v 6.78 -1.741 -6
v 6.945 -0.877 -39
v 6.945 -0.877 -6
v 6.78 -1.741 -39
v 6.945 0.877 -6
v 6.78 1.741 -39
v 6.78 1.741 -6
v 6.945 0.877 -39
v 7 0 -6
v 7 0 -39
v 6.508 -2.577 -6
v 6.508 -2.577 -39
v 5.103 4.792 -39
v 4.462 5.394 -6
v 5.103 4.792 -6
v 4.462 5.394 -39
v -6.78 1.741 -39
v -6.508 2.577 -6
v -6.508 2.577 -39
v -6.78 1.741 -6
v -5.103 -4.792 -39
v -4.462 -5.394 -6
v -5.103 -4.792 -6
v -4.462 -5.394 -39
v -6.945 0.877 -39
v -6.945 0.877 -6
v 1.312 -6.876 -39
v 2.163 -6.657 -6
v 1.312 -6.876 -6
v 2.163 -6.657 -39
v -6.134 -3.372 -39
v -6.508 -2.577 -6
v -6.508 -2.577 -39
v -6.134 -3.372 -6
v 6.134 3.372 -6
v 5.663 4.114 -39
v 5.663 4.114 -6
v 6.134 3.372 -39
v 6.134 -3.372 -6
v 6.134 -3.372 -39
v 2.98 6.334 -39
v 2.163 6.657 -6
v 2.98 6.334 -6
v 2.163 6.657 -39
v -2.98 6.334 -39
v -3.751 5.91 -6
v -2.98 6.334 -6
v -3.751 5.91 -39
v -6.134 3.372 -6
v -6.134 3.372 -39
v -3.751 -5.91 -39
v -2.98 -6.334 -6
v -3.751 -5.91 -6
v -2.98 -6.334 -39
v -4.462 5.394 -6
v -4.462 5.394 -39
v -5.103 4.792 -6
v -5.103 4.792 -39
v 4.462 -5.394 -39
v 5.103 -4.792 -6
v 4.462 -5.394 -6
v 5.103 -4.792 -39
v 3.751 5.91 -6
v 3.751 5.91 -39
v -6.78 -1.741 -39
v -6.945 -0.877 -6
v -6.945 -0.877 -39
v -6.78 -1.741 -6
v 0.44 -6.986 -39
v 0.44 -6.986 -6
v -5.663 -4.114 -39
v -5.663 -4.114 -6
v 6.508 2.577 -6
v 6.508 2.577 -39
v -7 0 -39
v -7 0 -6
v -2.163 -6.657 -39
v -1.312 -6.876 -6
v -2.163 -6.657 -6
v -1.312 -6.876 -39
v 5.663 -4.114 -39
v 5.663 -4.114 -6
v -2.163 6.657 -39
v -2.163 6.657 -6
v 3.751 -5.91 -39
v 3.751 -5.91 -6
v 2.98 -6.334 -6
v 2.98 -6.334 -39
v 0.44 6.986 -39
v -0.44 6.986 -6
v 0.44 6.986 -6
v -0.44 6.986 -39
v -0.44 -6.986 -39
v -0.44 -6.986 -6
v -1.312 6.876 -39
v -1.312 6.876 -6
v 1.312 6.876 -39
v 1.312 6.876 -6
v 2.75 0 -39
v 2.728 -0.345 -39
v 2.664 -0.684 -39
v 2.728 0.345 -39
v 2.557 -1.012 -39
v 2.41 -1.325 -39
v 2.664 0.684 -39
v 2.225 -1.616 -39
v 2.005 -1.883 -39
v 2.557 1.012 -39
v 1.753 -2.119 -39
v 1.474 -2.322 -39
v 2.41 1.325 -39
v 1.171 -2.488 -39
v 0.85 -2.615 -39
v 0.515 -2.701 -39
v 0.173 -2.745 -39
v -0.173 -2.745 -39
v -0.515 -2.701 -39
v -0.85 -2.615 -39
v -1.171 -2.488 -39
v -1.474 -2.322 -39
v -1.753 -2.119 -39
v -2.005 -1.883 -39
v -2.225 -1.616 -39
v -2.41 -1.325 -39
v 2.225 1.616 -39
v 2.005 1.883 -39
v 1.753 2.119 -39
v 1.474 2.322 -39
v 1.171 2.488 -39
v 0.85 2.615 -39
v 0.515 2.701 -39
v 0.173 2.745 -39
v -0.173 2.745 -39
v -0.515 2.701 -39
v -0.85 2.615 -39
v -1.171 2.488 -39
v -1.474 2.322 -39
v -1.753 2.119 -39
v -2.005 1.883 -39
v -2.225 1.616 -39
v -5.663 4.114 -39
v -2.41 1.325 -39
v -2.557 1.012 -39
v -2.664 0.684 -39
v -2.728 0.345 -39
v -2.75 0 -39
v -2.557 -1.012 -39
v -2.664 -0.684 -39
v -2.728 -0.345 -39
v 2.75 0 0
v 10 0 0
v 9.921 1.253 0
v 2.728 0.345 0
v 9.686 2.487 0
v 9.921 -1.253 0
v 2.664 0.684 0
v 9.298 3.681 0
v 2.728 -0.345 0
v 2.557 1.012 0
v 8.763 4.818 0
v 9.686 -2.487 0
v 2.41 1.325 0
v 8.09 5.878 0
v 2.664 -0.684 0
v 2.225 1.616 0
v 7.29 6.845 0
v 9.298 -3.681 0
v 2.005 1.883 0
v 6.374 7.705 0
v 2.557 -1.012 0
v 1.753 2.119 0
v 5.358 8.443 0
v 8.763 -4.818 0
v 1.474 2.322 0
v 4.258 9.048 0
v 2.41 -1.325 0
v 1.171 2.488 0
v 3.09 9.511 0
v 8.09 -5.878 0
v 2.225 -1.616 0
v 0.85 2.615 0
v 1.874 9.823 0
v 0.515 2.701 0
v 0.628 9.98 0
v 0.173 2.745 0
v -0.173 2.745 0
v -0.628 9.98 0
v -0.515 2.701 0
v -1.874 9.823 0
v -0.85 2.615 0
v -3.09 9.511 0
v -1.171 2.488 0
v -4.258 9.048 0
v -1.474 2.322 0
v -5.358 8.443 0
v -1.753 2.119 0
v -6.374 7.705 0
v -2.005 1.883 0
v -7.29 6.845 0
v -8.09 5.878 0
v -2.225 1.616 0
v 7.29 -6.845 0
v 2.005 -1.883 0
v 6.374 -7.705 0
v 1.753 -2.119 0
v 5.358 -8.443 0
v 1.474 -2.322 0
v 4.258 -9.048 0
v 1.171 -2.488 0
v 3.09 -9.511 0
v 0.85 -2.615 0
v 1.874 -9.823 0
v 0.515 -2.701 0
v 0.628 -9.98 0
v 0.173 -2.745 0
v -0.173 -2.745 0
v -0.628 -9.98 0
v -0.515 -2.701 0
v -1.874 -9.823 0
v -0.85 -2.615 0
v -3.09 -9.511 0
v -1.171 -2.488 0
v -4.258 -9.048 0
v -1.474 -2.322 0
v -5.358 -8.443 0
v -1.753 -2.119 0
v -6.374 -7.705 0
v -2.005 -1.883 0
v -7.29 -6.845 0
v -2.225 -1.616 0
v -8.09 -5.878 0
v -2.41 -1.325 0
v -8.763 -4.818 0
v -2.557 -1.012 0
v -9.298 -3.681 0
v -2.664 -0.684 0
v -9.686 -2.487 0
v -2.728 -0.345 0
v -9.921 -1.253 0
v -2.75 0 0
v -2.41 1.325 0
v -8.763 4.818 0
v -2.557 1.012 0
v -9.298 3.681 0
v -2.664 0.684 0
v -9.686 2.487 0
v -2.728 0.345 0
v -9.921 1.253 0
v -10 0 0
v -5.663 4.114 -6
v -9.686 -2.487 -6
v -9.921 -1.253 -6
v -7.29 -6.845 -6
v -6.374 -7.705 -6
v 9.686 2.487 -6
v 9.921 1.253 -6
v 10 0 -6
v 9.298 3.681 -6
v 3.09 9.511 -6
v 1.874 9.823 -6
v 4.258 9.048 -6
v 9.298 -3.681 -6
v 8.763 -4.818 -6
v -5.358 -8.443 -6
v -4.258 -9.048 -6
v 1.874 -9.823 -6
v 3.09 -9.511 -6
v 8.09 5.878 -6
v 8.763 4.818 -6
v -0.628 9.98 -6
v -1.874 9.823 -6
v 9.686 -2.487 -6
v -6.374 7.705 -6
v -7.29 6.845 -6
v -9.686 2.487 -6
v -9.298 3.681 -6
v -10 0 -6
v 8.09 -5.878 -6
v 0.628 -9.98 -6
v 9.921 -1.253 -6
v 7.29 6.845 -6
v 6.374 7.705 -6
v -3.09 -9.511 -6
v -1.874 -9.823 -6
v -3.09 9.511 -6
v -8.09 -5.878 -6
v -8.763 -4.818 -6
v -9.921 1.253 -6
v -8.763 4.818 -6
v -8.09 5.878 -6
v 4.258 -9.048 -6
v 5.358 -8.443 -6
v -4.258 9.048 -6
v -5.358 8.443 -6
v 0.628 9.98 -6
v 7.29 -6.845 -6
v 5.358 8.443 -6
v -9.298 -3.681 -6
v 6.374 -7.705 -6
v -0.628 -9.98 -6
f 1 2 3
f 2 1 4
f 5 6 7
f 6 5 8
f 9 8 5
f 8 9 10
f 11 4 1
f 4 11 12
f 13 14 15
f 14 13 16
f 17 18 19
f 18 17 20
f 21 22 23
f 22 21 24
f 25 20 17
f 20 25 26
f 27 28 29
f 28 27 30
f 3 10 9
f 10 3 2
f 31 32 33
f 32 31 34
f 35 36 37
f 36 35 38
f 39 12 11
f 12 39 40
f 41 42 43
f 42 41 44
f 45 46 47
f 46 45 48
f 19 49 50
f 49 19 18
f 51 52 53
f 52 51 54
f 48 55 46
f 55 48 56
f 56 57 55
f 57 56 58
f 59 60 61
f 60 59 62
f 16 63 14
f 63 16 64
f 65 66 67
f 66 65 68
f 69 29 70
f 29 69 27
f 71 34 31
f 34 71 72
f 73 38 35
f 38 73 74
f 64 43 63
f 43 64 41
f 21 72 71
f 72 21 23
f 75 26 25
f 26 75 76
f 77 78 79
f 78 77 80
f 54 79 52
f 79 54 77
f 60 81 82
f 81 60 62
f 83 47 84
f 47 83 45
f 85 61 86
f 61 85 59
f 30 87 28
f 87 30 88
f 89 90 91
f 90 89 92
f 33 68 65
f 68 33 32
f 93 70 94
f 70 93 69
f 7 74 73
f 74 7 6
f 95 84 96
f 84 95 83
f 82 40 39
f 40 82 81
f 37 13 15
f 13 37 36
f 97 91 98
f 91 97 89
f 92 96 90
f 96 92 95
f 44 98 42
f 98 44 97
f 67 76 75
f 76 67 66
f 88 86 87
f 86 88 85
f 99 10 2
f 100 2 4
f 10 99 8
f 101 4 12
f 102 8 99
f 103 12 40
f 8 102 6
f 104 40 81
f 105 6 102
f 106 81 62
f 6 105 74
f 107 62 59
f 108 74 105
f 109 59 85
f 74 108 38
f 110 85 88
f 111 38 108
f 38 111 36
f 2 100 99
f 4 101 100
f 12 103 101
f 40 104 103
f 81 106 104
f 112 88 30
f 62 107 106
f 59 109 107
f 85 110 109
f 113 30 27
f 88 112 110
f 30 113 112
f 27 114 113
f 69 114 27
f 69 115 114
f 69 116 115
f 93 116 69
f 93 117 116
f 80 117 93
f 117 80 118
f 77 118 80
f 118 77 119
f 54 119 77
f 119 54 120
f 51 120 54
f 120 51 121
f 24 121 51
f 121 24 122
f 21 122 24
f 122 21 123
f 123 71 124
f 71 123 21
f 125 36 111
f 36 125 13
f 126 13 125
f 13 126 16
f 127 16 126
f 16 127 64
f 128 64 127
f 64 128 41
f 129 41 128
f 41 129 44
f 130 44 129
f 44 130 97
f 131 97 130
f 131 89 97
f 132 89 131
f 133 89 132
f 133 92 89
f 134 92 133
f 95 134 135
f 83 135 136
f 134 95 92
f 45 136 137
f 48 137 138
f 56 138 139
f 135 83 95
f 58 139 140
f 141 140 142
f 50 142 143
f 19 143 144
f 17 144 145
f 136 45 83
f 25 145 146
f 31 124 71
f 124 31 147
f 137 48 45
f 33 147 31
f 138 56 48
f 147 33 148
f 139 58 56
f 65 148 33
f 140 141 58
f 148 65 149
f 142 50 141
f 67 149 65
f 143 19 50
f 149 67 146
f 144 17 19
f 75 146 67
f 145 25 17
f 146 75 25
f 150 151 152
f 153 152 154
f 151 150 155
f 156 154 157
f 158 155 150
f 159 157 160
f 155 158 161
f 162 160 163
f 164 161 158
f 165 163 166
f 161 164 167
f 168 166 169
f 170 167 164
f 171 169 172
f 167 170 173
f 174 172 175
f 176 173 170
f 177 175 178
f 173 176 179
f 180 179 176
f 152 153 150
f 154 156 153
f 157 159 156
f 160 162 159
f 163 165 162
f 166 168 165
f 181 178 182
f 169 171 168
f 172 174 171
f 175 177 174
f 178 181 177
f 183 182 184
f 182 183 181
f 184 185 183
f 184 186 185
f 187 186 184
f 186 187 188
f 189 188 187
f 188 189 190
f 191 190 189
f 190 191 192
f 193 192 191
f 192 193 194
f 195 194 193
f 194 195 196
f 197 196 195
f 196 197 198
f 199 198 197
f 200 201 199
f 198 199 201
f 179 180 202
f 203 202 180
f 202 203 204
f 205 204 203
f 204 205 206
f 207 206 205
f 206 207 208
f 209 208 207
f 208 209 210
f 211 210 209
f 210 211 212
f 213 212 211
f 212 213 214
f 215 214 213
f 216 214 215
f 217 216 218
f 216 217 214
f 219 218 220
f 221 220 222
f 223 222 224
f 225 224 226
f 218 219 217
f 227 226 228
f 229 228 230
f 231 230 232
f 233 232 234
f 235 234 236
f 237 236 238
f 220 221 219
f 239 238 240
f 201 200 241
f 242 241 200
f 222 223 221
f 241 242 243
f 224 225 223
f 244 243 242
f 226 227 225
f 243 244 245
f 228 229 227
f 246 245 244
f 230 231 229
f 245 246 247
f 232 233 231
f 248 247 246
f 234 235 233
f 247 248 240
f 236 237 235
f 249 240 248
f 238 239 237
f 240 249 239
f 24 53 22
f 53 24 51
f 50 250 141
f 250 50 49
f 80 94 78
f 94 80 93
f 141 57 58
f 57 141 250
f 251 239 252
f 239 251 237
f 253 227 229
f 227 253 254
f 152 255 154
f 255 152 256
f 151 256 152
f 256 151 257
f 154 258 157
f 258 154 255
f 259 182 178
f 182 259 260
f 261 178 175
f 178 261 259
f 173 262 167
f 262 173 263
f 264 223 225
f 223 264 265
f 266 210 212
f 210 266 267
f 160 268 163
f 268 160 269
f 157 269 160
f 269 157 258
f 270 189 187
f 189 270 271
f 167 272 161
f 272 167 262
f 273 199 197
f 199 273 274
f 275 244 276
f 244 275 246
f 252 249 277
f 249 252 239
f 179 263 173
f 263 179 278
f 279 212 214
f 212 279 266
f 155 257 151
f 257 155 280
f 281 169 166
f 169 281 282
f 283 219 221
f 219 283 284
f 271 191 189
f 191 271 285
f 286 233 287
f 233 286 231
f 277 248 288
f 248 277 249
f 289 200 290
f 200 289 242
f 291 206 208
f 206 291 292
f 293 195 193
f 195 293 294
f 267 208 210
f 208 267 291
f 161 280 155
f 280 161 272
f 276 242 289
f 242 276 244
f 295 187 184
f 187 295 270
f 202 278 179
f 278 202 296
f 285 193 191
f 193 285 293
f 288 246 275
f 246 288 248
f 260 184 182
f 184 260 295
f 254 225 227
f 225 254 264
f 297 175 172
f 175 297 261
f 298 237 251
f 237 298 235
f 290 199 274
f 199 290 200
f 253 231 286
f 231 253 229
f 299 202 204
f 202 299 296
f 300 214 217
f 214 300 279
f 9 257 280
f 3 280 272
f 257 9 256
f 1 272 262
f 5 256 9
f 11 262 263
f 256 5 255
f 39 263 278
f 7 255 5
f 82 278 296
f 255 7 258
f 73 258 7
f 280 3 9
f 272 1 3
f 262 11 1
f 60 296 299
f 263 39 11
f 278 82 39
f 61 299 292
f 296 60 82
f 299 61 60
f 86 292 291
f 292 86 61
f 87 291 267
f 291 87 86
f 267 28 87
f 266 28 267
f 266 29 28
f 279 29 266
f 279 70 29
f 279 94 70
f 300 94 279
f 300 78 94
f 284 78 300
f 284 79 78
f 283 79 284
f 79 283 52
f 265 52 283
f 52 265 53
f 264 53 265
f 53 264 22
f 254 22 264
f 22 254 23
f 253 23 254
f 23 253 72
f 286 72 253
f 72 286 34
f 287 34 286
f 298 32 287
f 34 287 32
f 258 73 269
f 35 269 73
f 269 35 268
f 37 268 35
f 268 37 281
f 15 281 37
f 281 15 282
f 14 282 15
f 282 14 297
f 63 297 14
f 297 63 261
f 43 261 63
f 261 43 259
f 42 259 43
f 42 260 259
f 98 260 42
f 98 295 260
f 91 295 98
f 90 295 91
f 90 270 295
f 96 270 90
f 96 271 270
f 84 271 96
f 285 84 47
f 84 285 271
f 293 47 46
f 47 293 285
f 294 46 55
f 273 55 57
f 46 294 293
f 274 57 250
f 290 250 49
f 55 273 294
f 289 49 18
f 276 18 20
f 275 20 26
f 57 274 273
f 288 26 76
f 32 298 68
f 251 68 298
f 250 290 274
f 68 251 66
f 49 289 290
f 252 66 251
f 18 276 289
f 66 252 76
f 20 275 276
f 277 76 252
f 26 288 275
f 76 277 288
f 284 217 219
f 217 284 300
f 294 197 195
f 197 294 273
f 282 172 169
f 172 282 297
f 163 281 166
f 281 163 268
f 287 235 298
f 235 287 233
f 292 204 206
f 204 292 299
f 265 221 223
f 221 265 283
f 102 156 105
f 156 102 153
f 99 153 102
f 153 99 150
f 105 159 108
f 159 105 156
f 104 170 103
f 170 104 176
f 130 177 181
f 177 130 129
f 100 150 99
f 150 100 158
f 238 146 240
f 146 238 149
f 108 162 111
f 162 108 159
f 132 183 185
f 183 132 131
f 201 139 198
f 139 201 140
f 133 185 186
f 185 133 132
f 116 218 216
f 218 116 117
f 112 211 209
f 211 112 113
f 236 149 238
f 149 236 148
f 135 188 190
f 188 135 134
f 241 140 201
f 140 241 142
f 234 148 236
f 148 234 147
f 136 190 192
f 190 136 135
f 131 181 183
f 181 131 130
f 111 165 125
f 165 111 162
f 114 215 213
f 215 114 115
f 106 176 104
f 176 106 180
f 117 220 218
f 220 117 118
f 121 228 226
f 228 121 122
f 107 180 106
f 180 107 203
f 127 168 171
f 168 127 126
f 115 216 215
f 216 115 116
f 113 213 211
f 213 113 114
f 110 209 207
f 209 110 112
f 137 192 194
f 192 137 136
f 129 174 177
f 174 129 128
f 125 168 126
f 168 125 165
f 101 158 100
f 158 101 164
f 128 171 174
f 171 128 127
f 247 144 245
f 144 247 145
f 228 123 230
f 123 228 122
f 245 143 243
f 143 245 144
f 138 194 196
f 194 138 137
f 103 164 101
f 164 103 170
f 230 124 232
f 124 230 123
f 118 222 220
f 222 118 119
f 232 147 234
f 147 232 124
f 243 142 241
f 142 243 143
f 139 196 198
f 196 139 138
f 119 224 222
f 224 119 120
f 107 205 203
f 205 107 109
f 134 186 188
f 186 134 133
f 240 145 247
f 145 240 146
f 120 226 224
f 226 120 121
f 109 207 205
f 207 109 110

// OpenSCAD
$fn = 50;


difference() {
	union() {
		translate(v = [0, 0, -39.0000000000]) {
			cylinder(h = 39, r = 7.0000000000);
		}
		translate(v = [0, 0, -6.0000000000]) {
			cylinder(h = 6, r = 10.0000000000);
		}
	}
	union() {
		#translate(v = [0, 0, -39]) {
			cylinder(h = 39, r = 2.7500000000);
		}
	}
}
